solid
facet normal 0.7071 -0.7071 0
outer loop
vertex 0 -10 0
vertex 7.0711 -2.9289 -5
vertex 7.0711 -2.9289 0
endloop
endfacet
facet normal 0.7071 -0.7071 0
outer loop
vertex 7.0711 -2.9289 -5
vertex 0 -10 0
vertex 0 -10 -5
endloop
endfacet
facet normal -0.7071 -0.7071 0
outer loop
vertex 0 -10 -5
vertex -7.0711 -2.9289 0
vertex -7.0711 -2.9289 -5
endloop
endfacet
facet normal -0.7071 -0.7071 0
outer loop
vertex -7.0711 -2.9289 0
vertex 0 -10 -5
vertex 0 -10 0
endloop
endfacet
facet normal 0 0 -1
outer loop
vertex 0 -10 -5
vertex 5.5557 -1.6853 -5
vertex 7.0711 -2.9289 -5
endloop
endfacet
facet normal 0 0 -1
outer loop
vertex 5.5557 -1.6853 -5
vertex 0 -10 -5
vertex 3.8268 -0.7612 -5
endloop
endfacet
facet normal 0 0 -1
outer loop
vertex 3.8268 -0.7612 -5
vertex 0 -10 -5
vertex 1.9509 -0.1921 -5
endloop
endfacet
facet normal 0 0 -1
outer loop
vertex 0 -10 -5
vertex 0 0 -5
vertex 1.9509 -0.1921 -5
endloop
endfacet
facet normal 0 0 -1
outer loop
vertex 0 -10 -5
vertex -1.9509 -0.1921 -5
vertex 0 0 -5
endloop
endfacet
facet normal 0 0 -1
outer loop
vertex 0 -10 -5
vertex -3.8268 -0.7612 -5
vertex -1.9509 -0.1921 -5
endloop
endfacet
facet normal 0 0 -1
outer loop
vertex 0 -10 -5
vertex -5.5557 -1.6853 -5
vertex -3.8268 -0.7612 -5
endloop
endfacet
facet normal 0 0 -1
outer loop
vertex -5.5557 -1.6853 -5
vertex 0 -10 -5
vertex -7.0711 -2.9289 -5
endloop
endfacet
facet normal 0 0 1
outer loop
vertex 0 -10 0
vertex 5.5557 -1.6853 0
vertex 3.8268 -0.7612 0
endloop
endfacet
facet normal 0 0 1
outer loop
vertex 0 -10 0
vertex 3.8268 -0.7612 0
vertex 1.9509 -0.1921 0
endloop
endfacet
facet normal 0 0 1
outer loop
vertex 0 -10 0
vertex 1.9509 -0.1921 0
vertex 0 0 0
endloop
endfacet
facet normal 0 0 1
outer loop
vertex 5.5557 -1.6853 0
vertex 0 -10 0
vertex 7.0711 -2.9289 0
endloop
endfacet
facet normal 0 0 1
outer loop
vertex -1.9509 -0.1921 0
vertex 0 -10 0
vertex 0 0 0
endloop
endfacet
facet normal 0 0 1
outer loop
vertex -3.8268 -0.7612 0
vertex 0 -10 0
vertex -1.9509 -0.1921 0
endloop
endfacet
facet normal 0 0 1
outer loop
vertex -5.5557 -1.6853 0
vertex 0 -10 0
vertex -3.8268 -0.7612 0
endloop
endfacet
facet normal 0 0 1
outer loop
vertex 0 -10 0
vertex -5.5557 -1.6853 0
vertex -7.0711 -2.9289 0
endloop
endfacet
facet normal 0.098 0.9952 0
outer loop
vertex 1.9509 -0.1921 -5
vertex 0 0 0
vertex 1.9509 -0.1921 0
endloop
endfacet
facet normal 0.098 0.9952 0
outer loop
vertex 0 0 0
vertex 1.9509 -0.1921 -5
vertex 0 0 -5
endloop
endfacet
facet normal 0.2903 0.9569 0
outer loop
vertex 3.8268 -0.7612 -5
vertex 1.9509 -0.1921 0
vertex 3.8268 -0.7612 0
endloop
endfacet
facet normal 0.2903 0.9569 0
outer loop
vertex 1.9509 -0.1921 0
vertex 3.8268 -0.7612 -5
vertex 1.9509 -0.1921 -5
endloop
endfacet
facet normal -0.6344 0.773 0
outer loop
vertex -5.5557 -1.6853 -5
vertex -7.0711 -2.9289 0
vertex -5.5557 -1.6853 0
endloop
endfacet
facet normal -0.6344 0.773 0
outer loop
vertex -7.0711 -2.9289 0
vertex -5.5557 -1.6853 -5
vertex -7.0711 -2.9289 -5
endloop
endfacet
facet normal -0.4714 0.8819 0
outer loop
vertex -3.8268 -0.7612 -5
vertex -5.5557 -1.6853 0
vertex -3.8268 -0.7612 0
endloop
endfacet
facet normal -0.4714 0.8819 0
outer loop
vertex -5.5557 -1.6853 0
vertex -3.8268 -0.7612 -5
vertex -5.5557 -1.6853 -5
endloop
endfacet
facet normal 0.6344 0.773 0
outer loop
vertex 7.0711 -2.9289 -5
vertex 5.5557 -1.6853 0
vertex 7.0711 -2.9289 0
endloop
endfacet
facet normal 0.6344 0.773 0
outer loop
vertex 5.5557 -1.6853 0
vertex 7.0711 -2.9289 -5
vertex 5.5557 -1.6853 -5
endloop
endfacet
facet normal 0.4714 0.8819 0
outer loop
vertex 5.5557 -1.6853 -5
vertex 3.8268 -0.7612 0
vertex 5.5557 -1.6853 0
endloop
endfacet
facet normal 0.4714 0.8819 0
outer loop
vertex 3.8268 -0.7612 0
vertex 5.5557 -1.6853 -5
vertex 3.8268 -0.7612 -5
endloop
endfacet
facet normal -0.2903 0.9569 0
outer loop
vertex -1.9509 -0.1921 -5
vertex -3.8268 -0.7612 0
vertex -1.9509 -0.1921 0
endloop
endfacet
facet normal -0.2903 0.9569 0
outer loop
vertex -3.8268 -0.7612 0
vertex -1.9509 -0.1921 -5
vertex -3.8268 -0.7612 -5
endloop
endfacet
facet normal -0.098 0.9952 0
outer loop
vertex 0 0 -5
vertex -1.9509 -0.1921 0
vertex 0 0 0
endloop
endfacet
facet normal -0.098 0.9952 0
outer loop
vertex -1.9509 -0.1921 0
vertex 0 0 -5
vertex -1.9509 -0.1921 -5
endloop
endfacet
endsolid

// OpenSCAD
// file: Cylinder.scad
// Auther: Tobias Grundtvig
// Date: Oct 1, 2020
//
// A wrapper of the build-in cylinder module, to get consistent naming

Cylinder(diameter=10, height=5, t_x="neg", t_z="pos");

module Cylinder(diameter, height, t_x="center", t_y="center", t_z="center", angular_resolution=32)
{
    tx = t_x == "neg" ? -diameter/2 : 
            t_x == "pos" ? diameter/2 : 0;
    ty = t_y == "neg" ? -diameter/2 : 
            t_y == "pos" ? diameter/2 : 0;
    tz = t_z == "neg" ? -height/2 : 
            t_z == "pos" ? height/2 : 0;
    translate([tx,ty,tz])
        cylinder(d=diameter, h=height, center=true, $fn=angular_resolution);
}
// file: Pie_2D.scad
// Auther: Tobias Grundtvig
// Date: Oct 1, 2020
//
//  A 2-dimensional pie
//  can be used to linear-extract a 3D Pie


Pie_2D(diameter=10, from_angle=45, to_angle=315, steps=32);
translate([2,0,0])
Pie_2D(diameter=10, from_angle=315, to_angle=45, steps=32);

module Pie_2D(diameter, from_angle, to_angle, steps=32)
{
    step_size = from_angle < to_angle ?
                (to_angle-from_angle)/steps :
                (360 - (from_angle-to_angle))/steps;
    r=diameter/2;
    points = from_angle < to_angle ?
        [
            for(i = [0:steps])
            [r * cos(from_angle+i*step_size), r * sin(from_angle+i*step_size)]
        ] :
        [
            for(i = [0:steps])
            [r * cos(from_angle+i*step_size), r * sin(from_angle+i*step_size)]
        ];
            
    polygon(concat([[0, 0]], points));
}
// main file
// Auther: Tobias Grundtvig
// Date: Oct 1, 2020
//
// A segment of a cylinder

use <Pie_2D.scad>
use <Cylinder.scad>

Cylinder_Segment(diameter=20, height=5, from_angle=45, to_angle=135, t_y="neg", t_z="neg");

module Cylinder_Segment(diameter,
                        height,
                        from_angle,
                        to_angle,
                        t_x="center",
                        t_y="center",
                        t_z="center",
                        angular_resolution=32)
{
    tx = t_x == "neg" ? -diameter/2 : 
            t_x == "pos" ? diameter/2 : 0;
    ty = t_y == "neg" ? -diameter/2 : 
            t_y == "pos" ? diameter/2 : 0;
    tz = t_z == "neg" ? -height/2 : 
            t_z == "pos" ? height/2 : 0;
    translate([tx, ty, tz])
    intersection()
    {
        linear_extrude(height=height, center=true)
        {
            Pie_2D
            (
                diameter=diameter*2,
                from_angle=from_angle,
                to_angle=to_angle,
                steps = 8
            );
        }
        Cylinder(   diameter=diameter,
                    height=height,
                    angular_resolution=angular_resolution);
    }
}
